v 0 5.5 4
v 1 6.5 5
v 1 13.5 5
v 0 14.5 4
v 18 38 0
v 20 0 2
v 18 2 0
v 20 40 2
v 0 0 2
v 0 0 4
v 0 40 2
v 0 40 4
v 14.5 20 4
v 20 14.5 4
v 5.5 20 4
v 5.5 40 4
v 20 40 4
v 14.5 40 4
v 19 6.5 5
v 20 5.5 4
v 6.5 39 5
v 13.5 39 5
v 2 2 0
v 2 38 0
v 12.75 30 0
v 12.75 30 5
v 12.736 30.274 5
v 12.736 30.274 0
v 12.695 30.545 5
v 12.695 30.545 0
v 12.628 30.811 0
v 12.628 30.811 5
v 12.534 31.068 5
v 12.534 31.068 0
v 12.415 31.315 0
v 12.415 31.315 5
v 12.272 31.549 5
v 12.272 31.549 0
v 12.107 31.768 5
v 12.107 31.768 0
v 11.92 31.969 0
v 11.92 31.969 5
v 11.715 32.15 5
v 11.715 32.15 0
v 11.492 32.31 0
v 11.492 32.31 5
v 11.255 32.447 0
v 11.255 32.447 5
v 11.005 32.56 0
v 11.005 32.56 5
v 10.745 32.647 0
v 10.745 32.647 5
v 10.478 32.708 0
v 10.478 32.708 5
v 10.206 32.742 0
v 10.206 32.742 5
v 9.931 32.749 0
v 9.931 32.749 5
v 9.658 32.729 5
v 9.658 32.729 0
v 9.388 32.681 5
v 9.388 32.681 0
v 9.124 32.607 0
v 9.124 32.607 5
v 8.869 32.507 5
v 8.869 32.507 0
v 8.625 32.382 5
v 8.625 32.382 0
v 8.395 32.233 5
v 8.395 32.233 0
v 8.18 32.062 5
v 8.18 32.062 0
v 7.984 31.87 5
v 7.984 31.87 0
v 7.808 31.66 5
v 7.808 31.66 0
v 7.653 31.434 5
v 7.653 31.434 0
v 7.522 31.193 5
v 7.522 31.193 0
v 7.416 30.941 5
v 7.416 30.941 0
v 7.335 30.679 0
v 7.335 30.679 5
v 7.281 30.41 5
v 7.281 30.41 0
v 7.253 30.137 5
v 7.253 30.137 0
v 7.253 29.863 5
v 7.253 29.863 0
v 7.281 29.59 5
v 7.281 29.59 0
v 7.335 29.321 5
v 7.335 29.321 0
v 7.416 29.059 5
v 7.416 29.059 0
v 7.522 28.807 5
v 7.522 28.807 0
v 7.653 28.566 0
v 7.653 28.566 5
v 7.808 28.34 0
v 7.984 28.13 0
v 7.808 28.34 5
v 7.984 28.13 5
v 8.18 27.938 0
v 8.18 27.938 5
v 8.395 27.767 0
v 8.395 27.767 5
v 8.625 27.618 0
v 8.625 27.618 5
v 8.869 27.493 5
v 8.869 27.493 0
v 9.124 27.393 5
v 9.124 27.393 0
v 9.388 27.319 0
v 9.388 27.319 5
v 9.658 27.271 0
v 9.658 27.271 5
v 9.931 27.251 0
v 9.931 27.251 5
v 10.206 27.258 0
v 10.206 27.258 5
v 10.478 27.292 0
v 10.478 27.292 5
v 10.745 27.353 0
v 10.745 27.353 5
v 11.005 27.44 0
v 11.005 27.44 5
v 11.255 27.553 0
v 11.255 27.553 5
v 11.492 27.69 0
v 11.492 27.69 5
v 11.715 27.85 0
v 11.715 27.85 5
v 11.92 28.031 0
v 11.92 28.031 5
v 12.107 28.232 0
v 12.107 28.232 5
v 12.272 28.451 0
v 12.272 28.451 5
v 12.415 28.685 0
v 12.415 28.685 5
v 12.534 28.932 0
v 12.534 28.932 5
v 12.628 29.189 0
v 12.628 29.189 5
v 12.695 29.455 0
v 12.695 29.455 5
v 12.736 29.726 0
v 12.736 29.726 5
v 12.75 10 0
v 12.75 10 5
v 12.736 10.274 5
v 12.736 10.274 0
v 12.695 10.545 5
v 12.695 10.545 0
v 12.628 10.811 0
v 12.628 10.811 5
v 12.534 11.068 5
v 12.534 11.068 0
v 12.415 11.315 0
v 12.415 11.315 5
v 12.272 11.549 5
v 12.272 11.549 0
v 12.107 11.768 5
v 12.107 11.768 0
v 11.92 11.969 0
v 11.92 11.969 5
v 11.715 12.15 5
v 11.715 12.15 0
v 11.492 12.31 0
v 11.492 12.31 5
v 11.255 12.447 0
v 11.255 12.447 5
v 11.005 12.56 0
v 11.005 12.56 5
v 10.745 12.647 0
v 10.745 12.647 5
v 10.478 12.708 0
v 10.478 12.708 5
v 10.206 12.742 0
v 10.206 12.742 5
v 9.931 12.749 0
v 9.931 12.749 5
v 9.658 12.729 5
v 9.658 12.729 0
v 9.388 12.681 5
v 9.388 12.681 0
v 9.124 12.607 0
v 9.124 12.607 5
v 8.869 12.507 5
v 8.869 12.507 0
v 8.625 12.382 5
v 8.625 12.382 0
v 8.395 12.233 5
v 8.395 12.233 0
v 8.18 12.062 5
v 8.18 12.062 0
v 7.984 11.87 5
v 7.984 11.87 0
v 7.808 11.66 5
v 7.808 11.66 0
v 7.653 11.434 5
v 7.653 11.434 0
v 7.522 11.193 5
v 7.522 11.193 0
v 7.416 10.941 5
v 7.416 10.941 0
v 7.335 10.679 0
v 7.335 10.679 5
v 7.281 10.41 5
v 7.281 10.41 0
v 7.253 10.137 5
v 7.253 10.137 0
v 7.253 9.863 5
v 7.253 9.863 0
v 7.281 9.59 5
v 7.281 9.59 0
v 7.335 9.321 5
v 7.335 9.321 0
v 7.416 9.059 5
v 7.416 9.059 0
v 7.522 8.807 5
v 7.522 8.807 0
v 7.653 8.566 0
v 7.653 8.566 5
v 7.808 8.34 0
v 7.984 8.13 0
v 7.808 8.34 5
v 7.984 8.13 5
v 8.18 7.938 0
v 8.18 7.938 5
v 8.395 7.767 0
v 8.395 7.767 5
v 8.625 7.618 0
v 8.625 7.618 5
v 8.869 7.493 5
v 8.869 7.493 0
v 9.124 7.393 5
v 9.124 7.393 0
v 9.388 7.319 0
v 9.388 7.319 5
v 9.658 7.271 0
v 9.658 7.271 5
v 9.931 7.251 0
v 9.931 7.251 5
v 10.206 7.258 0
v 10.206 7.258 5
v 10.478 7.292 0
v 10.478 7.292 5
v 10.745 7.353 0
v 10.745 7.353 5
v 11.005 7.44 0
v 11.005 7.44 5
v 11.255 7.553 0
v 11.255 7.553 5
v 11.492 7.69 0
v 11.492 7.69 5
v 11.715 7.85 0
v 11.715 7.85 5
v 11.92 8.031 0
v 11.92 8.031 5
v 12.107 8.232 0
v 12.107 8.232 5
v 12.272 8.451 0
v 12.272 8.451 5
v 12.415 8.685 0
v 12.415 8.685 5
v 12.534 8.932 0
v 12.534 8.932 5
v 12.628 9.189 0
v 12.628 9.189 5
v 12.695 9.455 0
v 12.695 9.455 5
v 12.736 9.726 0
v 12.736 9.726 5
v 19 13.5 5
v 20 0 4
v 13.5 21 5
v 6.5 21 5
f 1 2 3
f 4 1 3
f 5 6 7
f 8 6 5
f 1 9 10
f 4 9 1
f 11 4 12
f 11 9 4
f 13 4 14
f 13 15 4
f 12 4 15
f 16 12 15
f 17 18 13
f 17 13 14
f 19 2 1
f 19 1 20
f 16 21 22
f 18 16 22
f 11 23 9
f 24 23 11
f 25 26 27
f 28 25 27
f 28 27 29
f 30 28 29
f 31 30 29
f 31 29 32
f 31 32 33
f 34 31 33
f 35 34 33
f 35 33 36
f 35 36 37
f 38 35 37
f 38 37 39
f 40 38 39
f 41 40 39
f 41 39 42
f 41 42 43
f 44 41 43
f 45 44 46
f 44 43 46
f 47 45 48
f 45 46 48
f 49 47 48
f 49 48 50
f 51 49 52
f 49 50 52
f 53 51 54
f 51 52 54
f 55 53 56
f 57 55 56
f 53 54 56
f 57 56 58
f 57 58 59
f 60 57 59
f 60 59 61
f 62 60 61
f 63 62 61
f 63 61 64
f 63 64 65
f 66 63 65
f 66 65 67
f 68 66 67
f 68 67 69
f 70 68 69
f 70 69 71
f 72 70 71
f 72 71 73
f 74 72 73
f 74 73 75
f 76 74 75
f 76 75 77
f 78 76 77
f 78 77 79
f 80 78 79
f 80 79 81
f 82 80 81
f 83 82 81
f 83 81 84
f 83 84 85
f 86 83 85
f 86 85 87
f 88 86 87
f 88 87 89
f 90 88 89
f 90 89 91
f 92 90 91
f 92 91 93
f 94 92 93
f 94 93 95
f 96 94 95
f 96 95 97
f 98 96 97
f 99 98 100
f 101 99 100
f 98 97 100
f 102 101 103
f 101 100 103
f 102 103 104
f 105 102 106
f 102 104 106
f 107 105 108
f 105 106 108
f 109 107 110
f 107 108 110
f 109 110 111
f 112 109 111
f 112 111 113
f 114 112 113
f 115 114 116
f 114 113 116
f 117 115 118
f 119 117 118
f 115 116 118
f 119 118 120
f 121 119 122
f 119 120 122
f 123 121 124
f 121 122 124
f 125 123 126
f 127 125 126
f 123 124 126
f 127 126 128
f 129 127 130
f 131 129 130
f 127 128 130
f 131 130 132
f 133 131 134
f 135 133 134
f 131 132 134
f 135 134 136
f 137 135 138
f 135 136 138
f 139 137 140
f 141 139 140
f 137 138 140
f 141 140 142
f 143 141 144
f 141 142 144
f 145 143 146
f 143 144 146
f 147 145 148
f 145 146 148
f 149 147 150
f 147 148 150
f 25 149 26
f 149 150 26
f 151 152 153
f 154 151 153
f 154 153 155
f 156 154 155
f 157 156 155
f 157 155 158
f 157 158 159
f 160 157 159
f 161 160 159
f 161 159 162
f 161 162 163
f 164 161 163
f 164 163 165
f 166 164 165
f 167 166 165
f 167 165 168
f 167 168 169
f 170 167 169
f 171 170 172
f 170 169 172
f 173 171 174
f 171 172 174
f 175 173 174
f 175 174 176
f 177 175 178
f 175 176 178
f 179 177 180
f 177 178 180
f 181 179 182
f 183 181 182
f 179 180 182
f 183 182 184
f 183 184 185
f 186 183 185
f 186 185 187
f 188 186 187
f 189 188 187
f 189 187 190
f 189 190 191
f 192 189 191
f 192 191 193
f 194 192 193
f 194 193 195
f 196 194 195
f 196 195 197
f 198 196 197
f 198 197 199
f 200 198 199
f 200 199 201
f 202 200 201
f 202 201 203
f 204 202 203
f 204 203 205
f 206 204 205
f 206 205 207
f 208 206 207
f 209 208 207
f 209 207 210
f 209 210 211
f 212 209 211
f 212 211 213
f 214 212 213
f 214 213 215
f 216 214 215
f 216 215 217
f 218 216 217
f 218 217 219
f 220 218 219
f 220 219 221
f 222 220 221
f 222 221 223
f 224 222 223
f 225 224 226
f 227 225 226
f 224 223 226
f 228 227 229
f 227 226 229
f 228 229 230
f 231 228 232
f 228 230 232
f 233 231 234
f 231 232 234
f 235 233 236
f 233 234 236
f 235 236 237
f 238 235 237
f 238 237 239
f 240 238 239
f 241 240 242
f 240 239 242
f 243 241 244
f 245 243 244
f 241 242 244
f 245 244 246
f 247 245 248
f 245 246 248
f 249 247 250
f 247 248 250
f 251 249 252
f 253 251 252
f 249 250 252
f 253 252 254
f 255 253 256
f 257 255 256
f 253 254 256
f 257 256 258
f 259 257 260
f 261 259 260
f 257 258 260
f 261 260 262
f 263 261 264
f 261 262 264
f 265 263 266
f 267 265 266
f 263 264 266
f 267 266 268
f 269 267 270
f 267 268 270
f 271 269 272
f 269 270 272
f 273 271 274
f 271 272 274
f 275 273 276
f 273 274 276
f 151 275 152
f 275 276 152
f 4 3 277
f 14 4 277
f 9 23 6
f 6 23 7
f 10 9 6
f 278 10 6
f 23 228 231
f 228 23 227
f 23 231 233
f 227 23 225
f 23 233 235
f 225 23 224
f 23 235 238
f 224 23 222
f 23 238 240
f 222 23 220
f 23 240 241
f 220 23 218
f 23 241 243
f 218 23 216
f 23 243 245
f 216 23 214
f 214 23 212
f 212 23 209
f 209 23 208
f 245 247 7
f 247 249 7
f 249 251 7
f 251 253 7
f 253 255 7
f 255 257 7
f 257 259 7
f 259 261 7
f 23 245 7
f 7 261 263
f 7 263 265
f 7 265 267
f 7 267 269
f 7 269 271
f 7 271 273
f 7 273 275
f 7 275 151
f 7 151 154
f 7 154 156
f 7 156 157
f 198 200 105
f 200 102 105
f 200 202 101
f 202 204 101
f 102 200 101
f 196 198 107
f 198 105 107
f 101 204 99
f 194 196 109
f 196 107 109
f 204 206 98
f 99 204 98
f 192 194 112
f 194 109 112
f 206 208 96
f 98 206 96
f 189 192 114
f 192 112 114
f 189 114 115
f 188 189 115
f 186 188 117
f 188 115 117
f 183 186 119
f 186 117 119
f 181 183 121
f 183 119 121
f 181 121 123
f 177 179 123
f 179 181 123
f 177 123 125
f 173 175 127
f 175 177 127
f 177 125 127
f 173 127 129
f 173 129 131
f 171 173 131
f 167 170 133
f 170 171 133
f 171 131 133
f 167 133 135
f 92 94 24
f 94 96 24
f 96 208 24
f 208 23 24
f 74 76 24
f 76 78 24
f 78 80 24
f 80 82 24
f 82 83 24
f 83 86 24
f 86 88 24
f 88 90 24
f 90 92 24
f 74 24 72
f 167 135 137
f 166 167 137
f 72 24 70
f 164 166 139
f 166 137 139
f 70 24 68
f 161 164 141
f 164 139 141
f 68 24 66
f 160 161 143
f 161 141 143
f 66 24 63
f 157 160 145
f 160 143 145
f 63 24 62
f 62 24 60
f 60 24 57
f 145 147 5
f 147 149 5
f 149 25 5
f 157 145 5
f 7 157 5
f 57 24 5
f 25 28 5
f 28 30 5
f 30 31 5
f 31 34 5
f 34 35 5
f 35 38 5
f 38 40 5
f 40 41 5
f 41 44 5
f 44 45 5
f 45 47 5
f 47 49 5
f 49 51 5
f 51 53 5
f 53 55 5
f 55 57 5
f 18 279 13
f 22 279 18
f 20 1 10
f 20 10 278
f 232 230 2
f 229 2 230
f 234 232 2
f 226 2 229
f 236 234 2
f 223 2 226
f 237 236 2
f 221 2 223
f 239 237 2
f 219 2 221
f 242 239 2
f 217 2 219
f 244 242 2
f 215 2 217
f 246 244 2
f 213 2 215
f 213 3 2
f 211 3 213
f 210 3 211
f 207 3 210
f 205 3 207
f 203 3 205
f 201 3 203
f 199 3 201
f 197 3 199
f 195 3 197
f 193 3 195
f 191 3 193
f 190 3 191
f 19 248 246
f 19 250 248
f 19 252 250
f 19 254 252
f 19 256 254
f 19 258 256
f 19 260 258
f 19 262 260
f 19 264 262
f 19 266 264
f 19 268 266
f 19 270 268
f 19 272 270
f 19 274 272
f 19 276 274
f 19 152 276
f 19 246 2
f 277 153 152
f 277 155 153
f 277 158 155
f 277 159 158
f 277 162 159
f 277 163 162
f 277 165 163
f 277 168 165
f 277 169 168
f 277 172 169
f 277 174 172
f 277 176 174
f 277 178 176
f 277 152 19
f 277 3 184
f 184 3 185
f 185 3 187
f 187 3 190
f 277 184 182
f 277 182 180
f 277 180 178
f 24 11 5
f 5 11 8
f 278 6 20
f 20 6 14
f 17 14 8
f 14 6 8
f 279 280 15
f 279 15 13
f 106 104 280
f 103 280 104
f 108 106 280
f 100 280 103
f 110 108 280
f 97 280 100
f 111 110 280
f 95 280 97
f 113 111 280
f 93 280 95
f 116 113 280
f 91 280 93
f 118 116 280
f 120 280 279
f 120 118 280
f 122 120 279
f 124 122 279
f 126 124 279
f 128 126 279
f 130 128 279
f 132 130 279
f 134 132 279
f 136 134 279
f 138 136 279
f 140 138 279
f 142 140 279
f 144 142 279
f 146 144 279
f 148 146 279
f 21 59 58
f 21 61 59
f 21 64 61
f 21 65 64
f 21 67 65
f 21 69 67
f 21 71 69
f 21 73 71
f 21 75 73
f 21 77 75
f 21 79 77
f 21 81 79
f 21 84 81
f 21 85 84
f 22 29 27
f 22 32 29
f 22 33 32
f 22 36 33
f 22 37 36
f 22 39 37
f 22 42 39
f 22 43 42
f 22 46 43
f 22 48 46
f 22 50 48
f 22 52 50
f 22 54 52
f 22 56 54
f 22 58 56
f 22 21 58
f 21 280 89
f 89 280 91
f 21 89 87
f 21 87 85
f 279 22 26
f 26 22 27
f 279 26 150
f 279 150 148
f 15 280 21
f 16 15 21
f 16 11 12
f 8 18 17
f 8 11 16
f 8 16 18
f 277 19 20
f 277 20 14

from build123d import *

# Parameters (mm, degrees)
F0_W     = 20
F0_H     = 40
F1_DEPTH = 4
F2_W     = 9
F2_H     = 20
F2_W_2   = 20
F2_H_2   = 9
F3_DEPTH = 1
F4_SIZE  = 0.99999
F5_R     = 2.75
F6_DEPTH = 5.001
F7_SIZE  = 2


# Not quite as in the source:
# - a fillet or chamfer is up to 0.001 mm smaller than in the source, because OpenCascade refuses the exact size


with BuildPart() as f1:
    # F0 (on Top) → F1 (new body)
    with BuildSketch(Plane.XY):
        with Locations((10, 20)):
            Rectangle(F0_W, F0_H)
    extrude(amount=F1_DEPTH)

    # F2 (on face) → F3 (join)
    with BuildSketch(Plane.XY.offset(4)):
        with Locations((10, 30)):
            Rectangle(F2_W, F2_H)
        with Locations((10, 10)):
            Rectangle(F2_W_2, F2_H_2)
    extrude(amount=F3_DEPTH)

    # F4 (size 1 in the source; OpenCascade refuses exactly that, so slightly less here)
    f4_edges = [f1.edges().sort_by_distance(p)[0] for p in [
        (10, 40, 5),
        (5.5, 30, 5),
        (10, 20, 5),
        (14.5, 30, 5),
        (10, 14.5, 5),
        (0, 10, 5),
        (10, 5.5, 5),
        (20, 10, 5),
    ]]
    chamfer(f4_edges, length=F4_SIZE)

    # F5 (on face) → F6 (cut, through all)
    with BuildSketch(Plane.XY.offset(5)):
        with Locations((10, 30)):
            Circle(F5_R)
        with Locations((10, 10)):
            Circle(F5_R)
    extrude(amount=-F6_DEPTH, mode=Mode.SUBTRACT)

    # F7
    f7_edges = [f1.edges().sort_by_distance(p)[0] for p in [
        (0, 20, 0),
        (10, 0, 0),
        (20, 20, 0),
        (10, 40, 0),
    ]]
    chamfer(f7_edges, length=F7_SIZE)


solid = f1.part
